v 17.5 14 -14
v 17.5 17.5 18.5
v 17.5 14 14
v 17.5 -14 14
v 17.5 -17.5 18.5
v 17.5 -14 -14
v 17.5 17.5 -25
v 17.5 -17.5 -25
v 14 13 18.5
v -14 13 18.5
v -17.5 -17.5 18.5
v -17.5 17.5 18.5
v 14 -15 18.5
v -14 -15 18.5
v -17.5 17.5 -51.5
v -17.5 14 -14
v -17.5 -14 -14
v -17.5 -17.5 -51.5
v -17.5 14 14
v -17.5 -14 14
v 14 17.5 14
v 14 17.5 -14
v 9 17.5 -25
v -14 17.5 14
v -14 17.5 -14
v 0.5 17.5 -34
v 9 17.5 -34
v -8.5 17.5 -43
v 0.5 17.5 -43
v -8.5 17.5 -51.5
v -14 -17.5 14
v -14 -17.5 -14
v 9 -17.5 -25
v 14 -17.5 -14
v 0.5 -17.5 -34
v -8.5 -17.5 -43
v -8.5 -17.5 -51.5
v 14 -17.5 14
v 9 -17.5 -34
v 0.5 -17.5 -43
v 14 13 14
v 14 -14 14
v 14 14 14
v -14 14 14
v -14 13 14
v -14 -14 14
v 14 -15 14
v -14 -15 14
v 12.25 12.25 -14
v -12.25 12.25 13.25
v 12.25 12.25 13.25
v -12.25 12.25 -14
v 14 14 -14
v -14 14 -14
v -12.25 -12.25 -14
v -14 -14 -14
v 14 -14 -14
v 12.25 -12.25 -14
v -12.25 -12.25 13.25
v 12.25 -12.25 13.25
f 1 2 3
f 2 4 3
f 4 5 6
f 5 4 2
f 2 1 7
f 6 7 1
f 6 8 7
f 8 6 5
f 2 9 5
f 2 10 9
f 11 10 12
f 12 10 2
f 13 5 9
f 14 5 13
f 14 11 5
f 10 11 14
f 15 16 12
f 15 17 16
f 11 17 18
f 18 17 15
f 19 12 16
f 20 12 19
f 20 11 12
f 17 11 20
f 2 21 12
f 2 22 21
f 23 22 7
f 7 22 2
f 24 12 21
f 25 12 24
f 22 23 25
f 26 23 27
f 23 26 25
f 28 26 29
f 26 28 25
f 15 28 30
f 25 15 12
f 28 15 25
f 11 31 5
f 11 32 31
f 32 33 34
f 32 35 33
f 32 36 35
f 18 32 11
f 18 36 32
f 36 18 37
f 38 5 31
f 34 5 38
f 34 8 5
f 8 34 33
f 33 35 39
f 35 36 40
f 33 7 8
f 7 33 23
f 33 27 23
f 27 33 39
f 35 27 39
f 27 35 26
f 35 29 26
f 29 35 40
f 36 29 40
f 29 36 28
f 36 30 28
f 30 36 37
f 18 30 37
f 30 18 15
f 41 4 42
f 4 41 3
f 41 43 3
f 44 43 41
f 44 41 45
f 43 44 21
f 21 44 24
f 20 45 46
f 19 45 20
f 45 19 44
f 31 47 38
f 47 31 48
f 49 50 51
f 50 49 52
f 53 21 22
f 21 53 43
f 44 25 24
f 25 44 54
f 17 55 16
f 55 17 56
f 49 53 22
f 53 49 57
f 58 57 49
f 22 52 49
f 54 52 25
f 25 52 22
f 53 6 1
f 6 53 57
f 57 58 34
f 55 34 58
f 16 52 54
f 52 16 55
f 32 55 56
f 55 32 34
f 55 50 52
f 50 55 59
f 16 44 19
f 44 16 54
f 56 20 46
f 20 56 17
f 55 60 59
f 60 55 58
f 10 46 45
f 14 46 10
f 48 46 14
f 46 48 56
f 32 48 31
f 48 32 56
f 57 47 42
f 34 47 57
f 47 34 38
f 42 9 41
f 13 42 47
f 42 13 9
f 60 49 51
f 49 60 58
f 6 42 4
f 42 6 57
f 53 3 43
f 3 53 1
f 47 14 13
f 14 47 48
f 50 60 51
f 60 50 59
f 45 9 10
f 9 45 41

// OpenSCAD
// file: modules.scad
offset = [0,8,0];
zoom = [0.8,0.8,1];

module white( filename, text)
{
    translate([0,4,0])   scale(zoom)
    rotate([180,0,-90]) 
    union(){ 
        translate([-14,-6.4,-2.5])   rotate([0,0,90])  linear_extrude(5)  text (text,font="bold",size=3); 
        intersection() 
        {    
            cube([35,35,5],center=true); 
            translate([1.5,0,2.6])   scale([0.14,0.14,-1])surface(file = filename, center = true); 
        } 
    } 

};

module black( filename, text)
{
    translate([0,4,0])   scale(zoom)
    rotate([180,0,-90]) 
    difference() 
    {    
        cube([35,35,5],center=true); 
        translate([1.5,0,2.6])    scale([0.14,0.14,-1]) surface(file = filename, center = true);
        translate([-14,-6.4,-2.5])   rotate([0,0,90])  linear_extrude(6)  text (text,font="bold",size=3);
    } 
}

module shape()
{
    translate([0,8,0])   scale(zoom) rotate([180,0,0]) 
    {
        rotate([0,0,90]) translate([5,0,0])  cube([35,35,5.5],center=true);  
        // use for help
//        linear_extrude(5)  translate([-9,-4,0])   text("B",size=20);
    }
}

module cube_appendix()
{
    difference()
    {
        union()
        {
            translate([0,0,1])
            {
                cube([35,35,35],center=true);
                 translate([0,0,7]) cylinder(r=10,h=30,center=true);
            }
        }
        translate([0,0,-24]) cylinder(r=10,h=30,center=true);
    }
}

module blue_stairs()
{
        union()
        {
            translate([0,0,1])cube([35,35,35],center=true);
            translate([0,0,-20.5])cube([35,35,9],center=true);            
            translate([-4.25,0,-29.5])cube([35-8.5,35,9],center=true);            
            translate([-8.5,0,-29.5-9])cube([35-17,35,9],center=true);            
            translate([-13,0,-29.5-17.5])cube([35-26,35,9],center=true);            

        }
}
// main file
include <modules.scad>
difference()
{
    color([1,0,0])
    {
            blue_stairs();
    }
    translate([0,0,0])      union() color([0,1,0])
    {
        rotate([0,180,0])   translate([0,-5,-16])              shape();  
        rotate([90,0,0])
        {
            translate([0,-4,-15])       shape();  
            rotate([0,90,0])   translate([0,-4,-15])              shape();  
            rotate([0,180,0])   translate([0,-4,-15])              shape();  
            rotate([0,270,0])   translate([0,-4,-15])              shape();  
        }
    }
}
